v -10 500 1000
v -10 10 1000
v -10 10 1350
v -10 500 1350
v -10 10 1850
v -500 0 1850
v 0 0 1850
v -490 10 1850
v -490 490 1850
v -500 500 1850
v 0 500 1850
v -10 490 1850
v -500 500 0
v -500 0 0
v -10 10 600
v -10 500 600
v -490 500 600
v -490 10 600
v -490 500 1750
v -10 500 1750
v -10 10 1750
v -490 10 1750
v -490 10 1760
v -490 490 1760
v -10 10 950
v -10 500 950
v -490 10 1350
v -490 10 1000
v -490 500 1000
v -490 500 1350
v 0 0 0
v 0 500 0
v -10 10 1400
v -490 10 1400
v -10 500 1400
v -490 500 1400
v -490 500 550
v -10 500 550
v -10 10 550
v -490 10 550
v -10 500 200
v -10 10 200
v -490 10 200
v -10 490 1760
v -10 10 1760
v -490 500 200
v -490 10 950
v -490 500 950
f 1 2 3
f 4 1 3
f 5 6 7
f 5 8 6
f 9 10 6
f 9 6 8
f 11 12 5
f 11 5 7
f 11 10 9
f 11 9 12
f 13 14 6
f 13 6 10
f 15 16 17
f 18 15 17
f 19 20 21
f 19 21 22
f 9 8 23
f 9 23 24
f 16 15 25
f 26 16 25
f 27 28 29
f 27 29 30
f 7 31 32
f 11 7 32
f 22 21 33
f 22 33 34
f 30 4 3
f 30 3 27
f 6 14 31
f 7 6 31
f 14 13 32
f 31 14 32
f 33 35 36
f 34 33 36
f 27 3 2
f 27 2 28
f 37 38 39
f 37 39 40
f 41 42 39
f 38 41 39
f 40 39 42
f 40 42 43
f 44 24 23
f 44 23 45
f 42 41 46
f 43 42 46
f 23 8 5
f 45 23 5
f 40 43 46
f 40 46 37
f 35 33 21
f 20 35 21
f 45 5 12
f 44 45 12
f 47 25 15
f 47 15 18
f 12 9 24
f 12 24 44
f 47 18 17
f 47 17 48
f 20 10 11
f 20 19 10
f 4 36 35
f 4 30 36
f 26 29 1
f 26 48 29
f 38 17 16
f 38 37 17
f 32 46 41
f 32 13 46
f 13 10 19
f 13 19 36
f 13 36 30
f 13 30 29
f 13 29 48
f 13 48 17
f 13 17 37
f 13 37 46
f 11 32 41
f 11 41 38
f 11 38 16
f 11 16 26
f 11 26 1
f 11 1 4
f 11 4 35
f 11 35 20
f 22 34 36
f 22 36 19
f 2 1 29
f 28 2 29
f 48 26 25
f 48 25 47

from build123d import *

# Parameters (mm, degrees)
F0_W     = 500
F0_H     = 500
F1_DEPTH = 1850
F2_W     = 480
F2_H     = 350
F3_DEPTH = 490
F4_W     = 480
F4_H     = 480
F5_DEPTH = 90


with BuildPart() as f1:
    # F0 (on Top) → F1 (new body)
    with BuildSketch(Plane.XY):
        with Locations((-250, 250)):
            Rectangle(F0_W, F0_H)
    extrude(amount=F1_DEPTH)

    # F2 (on face) → F3 (cut)
    with BuildSketch(Plane(origin=(0, 500, 0), x_dir=(-1, 0, 0), z_dir=(0, 1, 0))):
        with Locations((250, 1575)):
            Rectangle(F2_W, F2_H)
        with Locations((250, 1175)):
            Rectangle(F2_W, F2_H)
        with Locations((250, 775)):
            Rectangle(F2_W, F2_H)
        with Locations((250, 375)):
            Rectangle(F2_W, F2_H)
    extrude(amount=-F3_DEPTH, mode=Mode.SUBTRACT)

    # F4 (on face) → F5 (cut)
    with BuildSketch(Plane.XY.offset(1850)):
        with Locations((-250, 250)):
            Rectangle(F4_W, F4_H)
    extrude(amount=-F5_DEPTH, mode=Mode.SUBTRACT)


solid = f1.part
